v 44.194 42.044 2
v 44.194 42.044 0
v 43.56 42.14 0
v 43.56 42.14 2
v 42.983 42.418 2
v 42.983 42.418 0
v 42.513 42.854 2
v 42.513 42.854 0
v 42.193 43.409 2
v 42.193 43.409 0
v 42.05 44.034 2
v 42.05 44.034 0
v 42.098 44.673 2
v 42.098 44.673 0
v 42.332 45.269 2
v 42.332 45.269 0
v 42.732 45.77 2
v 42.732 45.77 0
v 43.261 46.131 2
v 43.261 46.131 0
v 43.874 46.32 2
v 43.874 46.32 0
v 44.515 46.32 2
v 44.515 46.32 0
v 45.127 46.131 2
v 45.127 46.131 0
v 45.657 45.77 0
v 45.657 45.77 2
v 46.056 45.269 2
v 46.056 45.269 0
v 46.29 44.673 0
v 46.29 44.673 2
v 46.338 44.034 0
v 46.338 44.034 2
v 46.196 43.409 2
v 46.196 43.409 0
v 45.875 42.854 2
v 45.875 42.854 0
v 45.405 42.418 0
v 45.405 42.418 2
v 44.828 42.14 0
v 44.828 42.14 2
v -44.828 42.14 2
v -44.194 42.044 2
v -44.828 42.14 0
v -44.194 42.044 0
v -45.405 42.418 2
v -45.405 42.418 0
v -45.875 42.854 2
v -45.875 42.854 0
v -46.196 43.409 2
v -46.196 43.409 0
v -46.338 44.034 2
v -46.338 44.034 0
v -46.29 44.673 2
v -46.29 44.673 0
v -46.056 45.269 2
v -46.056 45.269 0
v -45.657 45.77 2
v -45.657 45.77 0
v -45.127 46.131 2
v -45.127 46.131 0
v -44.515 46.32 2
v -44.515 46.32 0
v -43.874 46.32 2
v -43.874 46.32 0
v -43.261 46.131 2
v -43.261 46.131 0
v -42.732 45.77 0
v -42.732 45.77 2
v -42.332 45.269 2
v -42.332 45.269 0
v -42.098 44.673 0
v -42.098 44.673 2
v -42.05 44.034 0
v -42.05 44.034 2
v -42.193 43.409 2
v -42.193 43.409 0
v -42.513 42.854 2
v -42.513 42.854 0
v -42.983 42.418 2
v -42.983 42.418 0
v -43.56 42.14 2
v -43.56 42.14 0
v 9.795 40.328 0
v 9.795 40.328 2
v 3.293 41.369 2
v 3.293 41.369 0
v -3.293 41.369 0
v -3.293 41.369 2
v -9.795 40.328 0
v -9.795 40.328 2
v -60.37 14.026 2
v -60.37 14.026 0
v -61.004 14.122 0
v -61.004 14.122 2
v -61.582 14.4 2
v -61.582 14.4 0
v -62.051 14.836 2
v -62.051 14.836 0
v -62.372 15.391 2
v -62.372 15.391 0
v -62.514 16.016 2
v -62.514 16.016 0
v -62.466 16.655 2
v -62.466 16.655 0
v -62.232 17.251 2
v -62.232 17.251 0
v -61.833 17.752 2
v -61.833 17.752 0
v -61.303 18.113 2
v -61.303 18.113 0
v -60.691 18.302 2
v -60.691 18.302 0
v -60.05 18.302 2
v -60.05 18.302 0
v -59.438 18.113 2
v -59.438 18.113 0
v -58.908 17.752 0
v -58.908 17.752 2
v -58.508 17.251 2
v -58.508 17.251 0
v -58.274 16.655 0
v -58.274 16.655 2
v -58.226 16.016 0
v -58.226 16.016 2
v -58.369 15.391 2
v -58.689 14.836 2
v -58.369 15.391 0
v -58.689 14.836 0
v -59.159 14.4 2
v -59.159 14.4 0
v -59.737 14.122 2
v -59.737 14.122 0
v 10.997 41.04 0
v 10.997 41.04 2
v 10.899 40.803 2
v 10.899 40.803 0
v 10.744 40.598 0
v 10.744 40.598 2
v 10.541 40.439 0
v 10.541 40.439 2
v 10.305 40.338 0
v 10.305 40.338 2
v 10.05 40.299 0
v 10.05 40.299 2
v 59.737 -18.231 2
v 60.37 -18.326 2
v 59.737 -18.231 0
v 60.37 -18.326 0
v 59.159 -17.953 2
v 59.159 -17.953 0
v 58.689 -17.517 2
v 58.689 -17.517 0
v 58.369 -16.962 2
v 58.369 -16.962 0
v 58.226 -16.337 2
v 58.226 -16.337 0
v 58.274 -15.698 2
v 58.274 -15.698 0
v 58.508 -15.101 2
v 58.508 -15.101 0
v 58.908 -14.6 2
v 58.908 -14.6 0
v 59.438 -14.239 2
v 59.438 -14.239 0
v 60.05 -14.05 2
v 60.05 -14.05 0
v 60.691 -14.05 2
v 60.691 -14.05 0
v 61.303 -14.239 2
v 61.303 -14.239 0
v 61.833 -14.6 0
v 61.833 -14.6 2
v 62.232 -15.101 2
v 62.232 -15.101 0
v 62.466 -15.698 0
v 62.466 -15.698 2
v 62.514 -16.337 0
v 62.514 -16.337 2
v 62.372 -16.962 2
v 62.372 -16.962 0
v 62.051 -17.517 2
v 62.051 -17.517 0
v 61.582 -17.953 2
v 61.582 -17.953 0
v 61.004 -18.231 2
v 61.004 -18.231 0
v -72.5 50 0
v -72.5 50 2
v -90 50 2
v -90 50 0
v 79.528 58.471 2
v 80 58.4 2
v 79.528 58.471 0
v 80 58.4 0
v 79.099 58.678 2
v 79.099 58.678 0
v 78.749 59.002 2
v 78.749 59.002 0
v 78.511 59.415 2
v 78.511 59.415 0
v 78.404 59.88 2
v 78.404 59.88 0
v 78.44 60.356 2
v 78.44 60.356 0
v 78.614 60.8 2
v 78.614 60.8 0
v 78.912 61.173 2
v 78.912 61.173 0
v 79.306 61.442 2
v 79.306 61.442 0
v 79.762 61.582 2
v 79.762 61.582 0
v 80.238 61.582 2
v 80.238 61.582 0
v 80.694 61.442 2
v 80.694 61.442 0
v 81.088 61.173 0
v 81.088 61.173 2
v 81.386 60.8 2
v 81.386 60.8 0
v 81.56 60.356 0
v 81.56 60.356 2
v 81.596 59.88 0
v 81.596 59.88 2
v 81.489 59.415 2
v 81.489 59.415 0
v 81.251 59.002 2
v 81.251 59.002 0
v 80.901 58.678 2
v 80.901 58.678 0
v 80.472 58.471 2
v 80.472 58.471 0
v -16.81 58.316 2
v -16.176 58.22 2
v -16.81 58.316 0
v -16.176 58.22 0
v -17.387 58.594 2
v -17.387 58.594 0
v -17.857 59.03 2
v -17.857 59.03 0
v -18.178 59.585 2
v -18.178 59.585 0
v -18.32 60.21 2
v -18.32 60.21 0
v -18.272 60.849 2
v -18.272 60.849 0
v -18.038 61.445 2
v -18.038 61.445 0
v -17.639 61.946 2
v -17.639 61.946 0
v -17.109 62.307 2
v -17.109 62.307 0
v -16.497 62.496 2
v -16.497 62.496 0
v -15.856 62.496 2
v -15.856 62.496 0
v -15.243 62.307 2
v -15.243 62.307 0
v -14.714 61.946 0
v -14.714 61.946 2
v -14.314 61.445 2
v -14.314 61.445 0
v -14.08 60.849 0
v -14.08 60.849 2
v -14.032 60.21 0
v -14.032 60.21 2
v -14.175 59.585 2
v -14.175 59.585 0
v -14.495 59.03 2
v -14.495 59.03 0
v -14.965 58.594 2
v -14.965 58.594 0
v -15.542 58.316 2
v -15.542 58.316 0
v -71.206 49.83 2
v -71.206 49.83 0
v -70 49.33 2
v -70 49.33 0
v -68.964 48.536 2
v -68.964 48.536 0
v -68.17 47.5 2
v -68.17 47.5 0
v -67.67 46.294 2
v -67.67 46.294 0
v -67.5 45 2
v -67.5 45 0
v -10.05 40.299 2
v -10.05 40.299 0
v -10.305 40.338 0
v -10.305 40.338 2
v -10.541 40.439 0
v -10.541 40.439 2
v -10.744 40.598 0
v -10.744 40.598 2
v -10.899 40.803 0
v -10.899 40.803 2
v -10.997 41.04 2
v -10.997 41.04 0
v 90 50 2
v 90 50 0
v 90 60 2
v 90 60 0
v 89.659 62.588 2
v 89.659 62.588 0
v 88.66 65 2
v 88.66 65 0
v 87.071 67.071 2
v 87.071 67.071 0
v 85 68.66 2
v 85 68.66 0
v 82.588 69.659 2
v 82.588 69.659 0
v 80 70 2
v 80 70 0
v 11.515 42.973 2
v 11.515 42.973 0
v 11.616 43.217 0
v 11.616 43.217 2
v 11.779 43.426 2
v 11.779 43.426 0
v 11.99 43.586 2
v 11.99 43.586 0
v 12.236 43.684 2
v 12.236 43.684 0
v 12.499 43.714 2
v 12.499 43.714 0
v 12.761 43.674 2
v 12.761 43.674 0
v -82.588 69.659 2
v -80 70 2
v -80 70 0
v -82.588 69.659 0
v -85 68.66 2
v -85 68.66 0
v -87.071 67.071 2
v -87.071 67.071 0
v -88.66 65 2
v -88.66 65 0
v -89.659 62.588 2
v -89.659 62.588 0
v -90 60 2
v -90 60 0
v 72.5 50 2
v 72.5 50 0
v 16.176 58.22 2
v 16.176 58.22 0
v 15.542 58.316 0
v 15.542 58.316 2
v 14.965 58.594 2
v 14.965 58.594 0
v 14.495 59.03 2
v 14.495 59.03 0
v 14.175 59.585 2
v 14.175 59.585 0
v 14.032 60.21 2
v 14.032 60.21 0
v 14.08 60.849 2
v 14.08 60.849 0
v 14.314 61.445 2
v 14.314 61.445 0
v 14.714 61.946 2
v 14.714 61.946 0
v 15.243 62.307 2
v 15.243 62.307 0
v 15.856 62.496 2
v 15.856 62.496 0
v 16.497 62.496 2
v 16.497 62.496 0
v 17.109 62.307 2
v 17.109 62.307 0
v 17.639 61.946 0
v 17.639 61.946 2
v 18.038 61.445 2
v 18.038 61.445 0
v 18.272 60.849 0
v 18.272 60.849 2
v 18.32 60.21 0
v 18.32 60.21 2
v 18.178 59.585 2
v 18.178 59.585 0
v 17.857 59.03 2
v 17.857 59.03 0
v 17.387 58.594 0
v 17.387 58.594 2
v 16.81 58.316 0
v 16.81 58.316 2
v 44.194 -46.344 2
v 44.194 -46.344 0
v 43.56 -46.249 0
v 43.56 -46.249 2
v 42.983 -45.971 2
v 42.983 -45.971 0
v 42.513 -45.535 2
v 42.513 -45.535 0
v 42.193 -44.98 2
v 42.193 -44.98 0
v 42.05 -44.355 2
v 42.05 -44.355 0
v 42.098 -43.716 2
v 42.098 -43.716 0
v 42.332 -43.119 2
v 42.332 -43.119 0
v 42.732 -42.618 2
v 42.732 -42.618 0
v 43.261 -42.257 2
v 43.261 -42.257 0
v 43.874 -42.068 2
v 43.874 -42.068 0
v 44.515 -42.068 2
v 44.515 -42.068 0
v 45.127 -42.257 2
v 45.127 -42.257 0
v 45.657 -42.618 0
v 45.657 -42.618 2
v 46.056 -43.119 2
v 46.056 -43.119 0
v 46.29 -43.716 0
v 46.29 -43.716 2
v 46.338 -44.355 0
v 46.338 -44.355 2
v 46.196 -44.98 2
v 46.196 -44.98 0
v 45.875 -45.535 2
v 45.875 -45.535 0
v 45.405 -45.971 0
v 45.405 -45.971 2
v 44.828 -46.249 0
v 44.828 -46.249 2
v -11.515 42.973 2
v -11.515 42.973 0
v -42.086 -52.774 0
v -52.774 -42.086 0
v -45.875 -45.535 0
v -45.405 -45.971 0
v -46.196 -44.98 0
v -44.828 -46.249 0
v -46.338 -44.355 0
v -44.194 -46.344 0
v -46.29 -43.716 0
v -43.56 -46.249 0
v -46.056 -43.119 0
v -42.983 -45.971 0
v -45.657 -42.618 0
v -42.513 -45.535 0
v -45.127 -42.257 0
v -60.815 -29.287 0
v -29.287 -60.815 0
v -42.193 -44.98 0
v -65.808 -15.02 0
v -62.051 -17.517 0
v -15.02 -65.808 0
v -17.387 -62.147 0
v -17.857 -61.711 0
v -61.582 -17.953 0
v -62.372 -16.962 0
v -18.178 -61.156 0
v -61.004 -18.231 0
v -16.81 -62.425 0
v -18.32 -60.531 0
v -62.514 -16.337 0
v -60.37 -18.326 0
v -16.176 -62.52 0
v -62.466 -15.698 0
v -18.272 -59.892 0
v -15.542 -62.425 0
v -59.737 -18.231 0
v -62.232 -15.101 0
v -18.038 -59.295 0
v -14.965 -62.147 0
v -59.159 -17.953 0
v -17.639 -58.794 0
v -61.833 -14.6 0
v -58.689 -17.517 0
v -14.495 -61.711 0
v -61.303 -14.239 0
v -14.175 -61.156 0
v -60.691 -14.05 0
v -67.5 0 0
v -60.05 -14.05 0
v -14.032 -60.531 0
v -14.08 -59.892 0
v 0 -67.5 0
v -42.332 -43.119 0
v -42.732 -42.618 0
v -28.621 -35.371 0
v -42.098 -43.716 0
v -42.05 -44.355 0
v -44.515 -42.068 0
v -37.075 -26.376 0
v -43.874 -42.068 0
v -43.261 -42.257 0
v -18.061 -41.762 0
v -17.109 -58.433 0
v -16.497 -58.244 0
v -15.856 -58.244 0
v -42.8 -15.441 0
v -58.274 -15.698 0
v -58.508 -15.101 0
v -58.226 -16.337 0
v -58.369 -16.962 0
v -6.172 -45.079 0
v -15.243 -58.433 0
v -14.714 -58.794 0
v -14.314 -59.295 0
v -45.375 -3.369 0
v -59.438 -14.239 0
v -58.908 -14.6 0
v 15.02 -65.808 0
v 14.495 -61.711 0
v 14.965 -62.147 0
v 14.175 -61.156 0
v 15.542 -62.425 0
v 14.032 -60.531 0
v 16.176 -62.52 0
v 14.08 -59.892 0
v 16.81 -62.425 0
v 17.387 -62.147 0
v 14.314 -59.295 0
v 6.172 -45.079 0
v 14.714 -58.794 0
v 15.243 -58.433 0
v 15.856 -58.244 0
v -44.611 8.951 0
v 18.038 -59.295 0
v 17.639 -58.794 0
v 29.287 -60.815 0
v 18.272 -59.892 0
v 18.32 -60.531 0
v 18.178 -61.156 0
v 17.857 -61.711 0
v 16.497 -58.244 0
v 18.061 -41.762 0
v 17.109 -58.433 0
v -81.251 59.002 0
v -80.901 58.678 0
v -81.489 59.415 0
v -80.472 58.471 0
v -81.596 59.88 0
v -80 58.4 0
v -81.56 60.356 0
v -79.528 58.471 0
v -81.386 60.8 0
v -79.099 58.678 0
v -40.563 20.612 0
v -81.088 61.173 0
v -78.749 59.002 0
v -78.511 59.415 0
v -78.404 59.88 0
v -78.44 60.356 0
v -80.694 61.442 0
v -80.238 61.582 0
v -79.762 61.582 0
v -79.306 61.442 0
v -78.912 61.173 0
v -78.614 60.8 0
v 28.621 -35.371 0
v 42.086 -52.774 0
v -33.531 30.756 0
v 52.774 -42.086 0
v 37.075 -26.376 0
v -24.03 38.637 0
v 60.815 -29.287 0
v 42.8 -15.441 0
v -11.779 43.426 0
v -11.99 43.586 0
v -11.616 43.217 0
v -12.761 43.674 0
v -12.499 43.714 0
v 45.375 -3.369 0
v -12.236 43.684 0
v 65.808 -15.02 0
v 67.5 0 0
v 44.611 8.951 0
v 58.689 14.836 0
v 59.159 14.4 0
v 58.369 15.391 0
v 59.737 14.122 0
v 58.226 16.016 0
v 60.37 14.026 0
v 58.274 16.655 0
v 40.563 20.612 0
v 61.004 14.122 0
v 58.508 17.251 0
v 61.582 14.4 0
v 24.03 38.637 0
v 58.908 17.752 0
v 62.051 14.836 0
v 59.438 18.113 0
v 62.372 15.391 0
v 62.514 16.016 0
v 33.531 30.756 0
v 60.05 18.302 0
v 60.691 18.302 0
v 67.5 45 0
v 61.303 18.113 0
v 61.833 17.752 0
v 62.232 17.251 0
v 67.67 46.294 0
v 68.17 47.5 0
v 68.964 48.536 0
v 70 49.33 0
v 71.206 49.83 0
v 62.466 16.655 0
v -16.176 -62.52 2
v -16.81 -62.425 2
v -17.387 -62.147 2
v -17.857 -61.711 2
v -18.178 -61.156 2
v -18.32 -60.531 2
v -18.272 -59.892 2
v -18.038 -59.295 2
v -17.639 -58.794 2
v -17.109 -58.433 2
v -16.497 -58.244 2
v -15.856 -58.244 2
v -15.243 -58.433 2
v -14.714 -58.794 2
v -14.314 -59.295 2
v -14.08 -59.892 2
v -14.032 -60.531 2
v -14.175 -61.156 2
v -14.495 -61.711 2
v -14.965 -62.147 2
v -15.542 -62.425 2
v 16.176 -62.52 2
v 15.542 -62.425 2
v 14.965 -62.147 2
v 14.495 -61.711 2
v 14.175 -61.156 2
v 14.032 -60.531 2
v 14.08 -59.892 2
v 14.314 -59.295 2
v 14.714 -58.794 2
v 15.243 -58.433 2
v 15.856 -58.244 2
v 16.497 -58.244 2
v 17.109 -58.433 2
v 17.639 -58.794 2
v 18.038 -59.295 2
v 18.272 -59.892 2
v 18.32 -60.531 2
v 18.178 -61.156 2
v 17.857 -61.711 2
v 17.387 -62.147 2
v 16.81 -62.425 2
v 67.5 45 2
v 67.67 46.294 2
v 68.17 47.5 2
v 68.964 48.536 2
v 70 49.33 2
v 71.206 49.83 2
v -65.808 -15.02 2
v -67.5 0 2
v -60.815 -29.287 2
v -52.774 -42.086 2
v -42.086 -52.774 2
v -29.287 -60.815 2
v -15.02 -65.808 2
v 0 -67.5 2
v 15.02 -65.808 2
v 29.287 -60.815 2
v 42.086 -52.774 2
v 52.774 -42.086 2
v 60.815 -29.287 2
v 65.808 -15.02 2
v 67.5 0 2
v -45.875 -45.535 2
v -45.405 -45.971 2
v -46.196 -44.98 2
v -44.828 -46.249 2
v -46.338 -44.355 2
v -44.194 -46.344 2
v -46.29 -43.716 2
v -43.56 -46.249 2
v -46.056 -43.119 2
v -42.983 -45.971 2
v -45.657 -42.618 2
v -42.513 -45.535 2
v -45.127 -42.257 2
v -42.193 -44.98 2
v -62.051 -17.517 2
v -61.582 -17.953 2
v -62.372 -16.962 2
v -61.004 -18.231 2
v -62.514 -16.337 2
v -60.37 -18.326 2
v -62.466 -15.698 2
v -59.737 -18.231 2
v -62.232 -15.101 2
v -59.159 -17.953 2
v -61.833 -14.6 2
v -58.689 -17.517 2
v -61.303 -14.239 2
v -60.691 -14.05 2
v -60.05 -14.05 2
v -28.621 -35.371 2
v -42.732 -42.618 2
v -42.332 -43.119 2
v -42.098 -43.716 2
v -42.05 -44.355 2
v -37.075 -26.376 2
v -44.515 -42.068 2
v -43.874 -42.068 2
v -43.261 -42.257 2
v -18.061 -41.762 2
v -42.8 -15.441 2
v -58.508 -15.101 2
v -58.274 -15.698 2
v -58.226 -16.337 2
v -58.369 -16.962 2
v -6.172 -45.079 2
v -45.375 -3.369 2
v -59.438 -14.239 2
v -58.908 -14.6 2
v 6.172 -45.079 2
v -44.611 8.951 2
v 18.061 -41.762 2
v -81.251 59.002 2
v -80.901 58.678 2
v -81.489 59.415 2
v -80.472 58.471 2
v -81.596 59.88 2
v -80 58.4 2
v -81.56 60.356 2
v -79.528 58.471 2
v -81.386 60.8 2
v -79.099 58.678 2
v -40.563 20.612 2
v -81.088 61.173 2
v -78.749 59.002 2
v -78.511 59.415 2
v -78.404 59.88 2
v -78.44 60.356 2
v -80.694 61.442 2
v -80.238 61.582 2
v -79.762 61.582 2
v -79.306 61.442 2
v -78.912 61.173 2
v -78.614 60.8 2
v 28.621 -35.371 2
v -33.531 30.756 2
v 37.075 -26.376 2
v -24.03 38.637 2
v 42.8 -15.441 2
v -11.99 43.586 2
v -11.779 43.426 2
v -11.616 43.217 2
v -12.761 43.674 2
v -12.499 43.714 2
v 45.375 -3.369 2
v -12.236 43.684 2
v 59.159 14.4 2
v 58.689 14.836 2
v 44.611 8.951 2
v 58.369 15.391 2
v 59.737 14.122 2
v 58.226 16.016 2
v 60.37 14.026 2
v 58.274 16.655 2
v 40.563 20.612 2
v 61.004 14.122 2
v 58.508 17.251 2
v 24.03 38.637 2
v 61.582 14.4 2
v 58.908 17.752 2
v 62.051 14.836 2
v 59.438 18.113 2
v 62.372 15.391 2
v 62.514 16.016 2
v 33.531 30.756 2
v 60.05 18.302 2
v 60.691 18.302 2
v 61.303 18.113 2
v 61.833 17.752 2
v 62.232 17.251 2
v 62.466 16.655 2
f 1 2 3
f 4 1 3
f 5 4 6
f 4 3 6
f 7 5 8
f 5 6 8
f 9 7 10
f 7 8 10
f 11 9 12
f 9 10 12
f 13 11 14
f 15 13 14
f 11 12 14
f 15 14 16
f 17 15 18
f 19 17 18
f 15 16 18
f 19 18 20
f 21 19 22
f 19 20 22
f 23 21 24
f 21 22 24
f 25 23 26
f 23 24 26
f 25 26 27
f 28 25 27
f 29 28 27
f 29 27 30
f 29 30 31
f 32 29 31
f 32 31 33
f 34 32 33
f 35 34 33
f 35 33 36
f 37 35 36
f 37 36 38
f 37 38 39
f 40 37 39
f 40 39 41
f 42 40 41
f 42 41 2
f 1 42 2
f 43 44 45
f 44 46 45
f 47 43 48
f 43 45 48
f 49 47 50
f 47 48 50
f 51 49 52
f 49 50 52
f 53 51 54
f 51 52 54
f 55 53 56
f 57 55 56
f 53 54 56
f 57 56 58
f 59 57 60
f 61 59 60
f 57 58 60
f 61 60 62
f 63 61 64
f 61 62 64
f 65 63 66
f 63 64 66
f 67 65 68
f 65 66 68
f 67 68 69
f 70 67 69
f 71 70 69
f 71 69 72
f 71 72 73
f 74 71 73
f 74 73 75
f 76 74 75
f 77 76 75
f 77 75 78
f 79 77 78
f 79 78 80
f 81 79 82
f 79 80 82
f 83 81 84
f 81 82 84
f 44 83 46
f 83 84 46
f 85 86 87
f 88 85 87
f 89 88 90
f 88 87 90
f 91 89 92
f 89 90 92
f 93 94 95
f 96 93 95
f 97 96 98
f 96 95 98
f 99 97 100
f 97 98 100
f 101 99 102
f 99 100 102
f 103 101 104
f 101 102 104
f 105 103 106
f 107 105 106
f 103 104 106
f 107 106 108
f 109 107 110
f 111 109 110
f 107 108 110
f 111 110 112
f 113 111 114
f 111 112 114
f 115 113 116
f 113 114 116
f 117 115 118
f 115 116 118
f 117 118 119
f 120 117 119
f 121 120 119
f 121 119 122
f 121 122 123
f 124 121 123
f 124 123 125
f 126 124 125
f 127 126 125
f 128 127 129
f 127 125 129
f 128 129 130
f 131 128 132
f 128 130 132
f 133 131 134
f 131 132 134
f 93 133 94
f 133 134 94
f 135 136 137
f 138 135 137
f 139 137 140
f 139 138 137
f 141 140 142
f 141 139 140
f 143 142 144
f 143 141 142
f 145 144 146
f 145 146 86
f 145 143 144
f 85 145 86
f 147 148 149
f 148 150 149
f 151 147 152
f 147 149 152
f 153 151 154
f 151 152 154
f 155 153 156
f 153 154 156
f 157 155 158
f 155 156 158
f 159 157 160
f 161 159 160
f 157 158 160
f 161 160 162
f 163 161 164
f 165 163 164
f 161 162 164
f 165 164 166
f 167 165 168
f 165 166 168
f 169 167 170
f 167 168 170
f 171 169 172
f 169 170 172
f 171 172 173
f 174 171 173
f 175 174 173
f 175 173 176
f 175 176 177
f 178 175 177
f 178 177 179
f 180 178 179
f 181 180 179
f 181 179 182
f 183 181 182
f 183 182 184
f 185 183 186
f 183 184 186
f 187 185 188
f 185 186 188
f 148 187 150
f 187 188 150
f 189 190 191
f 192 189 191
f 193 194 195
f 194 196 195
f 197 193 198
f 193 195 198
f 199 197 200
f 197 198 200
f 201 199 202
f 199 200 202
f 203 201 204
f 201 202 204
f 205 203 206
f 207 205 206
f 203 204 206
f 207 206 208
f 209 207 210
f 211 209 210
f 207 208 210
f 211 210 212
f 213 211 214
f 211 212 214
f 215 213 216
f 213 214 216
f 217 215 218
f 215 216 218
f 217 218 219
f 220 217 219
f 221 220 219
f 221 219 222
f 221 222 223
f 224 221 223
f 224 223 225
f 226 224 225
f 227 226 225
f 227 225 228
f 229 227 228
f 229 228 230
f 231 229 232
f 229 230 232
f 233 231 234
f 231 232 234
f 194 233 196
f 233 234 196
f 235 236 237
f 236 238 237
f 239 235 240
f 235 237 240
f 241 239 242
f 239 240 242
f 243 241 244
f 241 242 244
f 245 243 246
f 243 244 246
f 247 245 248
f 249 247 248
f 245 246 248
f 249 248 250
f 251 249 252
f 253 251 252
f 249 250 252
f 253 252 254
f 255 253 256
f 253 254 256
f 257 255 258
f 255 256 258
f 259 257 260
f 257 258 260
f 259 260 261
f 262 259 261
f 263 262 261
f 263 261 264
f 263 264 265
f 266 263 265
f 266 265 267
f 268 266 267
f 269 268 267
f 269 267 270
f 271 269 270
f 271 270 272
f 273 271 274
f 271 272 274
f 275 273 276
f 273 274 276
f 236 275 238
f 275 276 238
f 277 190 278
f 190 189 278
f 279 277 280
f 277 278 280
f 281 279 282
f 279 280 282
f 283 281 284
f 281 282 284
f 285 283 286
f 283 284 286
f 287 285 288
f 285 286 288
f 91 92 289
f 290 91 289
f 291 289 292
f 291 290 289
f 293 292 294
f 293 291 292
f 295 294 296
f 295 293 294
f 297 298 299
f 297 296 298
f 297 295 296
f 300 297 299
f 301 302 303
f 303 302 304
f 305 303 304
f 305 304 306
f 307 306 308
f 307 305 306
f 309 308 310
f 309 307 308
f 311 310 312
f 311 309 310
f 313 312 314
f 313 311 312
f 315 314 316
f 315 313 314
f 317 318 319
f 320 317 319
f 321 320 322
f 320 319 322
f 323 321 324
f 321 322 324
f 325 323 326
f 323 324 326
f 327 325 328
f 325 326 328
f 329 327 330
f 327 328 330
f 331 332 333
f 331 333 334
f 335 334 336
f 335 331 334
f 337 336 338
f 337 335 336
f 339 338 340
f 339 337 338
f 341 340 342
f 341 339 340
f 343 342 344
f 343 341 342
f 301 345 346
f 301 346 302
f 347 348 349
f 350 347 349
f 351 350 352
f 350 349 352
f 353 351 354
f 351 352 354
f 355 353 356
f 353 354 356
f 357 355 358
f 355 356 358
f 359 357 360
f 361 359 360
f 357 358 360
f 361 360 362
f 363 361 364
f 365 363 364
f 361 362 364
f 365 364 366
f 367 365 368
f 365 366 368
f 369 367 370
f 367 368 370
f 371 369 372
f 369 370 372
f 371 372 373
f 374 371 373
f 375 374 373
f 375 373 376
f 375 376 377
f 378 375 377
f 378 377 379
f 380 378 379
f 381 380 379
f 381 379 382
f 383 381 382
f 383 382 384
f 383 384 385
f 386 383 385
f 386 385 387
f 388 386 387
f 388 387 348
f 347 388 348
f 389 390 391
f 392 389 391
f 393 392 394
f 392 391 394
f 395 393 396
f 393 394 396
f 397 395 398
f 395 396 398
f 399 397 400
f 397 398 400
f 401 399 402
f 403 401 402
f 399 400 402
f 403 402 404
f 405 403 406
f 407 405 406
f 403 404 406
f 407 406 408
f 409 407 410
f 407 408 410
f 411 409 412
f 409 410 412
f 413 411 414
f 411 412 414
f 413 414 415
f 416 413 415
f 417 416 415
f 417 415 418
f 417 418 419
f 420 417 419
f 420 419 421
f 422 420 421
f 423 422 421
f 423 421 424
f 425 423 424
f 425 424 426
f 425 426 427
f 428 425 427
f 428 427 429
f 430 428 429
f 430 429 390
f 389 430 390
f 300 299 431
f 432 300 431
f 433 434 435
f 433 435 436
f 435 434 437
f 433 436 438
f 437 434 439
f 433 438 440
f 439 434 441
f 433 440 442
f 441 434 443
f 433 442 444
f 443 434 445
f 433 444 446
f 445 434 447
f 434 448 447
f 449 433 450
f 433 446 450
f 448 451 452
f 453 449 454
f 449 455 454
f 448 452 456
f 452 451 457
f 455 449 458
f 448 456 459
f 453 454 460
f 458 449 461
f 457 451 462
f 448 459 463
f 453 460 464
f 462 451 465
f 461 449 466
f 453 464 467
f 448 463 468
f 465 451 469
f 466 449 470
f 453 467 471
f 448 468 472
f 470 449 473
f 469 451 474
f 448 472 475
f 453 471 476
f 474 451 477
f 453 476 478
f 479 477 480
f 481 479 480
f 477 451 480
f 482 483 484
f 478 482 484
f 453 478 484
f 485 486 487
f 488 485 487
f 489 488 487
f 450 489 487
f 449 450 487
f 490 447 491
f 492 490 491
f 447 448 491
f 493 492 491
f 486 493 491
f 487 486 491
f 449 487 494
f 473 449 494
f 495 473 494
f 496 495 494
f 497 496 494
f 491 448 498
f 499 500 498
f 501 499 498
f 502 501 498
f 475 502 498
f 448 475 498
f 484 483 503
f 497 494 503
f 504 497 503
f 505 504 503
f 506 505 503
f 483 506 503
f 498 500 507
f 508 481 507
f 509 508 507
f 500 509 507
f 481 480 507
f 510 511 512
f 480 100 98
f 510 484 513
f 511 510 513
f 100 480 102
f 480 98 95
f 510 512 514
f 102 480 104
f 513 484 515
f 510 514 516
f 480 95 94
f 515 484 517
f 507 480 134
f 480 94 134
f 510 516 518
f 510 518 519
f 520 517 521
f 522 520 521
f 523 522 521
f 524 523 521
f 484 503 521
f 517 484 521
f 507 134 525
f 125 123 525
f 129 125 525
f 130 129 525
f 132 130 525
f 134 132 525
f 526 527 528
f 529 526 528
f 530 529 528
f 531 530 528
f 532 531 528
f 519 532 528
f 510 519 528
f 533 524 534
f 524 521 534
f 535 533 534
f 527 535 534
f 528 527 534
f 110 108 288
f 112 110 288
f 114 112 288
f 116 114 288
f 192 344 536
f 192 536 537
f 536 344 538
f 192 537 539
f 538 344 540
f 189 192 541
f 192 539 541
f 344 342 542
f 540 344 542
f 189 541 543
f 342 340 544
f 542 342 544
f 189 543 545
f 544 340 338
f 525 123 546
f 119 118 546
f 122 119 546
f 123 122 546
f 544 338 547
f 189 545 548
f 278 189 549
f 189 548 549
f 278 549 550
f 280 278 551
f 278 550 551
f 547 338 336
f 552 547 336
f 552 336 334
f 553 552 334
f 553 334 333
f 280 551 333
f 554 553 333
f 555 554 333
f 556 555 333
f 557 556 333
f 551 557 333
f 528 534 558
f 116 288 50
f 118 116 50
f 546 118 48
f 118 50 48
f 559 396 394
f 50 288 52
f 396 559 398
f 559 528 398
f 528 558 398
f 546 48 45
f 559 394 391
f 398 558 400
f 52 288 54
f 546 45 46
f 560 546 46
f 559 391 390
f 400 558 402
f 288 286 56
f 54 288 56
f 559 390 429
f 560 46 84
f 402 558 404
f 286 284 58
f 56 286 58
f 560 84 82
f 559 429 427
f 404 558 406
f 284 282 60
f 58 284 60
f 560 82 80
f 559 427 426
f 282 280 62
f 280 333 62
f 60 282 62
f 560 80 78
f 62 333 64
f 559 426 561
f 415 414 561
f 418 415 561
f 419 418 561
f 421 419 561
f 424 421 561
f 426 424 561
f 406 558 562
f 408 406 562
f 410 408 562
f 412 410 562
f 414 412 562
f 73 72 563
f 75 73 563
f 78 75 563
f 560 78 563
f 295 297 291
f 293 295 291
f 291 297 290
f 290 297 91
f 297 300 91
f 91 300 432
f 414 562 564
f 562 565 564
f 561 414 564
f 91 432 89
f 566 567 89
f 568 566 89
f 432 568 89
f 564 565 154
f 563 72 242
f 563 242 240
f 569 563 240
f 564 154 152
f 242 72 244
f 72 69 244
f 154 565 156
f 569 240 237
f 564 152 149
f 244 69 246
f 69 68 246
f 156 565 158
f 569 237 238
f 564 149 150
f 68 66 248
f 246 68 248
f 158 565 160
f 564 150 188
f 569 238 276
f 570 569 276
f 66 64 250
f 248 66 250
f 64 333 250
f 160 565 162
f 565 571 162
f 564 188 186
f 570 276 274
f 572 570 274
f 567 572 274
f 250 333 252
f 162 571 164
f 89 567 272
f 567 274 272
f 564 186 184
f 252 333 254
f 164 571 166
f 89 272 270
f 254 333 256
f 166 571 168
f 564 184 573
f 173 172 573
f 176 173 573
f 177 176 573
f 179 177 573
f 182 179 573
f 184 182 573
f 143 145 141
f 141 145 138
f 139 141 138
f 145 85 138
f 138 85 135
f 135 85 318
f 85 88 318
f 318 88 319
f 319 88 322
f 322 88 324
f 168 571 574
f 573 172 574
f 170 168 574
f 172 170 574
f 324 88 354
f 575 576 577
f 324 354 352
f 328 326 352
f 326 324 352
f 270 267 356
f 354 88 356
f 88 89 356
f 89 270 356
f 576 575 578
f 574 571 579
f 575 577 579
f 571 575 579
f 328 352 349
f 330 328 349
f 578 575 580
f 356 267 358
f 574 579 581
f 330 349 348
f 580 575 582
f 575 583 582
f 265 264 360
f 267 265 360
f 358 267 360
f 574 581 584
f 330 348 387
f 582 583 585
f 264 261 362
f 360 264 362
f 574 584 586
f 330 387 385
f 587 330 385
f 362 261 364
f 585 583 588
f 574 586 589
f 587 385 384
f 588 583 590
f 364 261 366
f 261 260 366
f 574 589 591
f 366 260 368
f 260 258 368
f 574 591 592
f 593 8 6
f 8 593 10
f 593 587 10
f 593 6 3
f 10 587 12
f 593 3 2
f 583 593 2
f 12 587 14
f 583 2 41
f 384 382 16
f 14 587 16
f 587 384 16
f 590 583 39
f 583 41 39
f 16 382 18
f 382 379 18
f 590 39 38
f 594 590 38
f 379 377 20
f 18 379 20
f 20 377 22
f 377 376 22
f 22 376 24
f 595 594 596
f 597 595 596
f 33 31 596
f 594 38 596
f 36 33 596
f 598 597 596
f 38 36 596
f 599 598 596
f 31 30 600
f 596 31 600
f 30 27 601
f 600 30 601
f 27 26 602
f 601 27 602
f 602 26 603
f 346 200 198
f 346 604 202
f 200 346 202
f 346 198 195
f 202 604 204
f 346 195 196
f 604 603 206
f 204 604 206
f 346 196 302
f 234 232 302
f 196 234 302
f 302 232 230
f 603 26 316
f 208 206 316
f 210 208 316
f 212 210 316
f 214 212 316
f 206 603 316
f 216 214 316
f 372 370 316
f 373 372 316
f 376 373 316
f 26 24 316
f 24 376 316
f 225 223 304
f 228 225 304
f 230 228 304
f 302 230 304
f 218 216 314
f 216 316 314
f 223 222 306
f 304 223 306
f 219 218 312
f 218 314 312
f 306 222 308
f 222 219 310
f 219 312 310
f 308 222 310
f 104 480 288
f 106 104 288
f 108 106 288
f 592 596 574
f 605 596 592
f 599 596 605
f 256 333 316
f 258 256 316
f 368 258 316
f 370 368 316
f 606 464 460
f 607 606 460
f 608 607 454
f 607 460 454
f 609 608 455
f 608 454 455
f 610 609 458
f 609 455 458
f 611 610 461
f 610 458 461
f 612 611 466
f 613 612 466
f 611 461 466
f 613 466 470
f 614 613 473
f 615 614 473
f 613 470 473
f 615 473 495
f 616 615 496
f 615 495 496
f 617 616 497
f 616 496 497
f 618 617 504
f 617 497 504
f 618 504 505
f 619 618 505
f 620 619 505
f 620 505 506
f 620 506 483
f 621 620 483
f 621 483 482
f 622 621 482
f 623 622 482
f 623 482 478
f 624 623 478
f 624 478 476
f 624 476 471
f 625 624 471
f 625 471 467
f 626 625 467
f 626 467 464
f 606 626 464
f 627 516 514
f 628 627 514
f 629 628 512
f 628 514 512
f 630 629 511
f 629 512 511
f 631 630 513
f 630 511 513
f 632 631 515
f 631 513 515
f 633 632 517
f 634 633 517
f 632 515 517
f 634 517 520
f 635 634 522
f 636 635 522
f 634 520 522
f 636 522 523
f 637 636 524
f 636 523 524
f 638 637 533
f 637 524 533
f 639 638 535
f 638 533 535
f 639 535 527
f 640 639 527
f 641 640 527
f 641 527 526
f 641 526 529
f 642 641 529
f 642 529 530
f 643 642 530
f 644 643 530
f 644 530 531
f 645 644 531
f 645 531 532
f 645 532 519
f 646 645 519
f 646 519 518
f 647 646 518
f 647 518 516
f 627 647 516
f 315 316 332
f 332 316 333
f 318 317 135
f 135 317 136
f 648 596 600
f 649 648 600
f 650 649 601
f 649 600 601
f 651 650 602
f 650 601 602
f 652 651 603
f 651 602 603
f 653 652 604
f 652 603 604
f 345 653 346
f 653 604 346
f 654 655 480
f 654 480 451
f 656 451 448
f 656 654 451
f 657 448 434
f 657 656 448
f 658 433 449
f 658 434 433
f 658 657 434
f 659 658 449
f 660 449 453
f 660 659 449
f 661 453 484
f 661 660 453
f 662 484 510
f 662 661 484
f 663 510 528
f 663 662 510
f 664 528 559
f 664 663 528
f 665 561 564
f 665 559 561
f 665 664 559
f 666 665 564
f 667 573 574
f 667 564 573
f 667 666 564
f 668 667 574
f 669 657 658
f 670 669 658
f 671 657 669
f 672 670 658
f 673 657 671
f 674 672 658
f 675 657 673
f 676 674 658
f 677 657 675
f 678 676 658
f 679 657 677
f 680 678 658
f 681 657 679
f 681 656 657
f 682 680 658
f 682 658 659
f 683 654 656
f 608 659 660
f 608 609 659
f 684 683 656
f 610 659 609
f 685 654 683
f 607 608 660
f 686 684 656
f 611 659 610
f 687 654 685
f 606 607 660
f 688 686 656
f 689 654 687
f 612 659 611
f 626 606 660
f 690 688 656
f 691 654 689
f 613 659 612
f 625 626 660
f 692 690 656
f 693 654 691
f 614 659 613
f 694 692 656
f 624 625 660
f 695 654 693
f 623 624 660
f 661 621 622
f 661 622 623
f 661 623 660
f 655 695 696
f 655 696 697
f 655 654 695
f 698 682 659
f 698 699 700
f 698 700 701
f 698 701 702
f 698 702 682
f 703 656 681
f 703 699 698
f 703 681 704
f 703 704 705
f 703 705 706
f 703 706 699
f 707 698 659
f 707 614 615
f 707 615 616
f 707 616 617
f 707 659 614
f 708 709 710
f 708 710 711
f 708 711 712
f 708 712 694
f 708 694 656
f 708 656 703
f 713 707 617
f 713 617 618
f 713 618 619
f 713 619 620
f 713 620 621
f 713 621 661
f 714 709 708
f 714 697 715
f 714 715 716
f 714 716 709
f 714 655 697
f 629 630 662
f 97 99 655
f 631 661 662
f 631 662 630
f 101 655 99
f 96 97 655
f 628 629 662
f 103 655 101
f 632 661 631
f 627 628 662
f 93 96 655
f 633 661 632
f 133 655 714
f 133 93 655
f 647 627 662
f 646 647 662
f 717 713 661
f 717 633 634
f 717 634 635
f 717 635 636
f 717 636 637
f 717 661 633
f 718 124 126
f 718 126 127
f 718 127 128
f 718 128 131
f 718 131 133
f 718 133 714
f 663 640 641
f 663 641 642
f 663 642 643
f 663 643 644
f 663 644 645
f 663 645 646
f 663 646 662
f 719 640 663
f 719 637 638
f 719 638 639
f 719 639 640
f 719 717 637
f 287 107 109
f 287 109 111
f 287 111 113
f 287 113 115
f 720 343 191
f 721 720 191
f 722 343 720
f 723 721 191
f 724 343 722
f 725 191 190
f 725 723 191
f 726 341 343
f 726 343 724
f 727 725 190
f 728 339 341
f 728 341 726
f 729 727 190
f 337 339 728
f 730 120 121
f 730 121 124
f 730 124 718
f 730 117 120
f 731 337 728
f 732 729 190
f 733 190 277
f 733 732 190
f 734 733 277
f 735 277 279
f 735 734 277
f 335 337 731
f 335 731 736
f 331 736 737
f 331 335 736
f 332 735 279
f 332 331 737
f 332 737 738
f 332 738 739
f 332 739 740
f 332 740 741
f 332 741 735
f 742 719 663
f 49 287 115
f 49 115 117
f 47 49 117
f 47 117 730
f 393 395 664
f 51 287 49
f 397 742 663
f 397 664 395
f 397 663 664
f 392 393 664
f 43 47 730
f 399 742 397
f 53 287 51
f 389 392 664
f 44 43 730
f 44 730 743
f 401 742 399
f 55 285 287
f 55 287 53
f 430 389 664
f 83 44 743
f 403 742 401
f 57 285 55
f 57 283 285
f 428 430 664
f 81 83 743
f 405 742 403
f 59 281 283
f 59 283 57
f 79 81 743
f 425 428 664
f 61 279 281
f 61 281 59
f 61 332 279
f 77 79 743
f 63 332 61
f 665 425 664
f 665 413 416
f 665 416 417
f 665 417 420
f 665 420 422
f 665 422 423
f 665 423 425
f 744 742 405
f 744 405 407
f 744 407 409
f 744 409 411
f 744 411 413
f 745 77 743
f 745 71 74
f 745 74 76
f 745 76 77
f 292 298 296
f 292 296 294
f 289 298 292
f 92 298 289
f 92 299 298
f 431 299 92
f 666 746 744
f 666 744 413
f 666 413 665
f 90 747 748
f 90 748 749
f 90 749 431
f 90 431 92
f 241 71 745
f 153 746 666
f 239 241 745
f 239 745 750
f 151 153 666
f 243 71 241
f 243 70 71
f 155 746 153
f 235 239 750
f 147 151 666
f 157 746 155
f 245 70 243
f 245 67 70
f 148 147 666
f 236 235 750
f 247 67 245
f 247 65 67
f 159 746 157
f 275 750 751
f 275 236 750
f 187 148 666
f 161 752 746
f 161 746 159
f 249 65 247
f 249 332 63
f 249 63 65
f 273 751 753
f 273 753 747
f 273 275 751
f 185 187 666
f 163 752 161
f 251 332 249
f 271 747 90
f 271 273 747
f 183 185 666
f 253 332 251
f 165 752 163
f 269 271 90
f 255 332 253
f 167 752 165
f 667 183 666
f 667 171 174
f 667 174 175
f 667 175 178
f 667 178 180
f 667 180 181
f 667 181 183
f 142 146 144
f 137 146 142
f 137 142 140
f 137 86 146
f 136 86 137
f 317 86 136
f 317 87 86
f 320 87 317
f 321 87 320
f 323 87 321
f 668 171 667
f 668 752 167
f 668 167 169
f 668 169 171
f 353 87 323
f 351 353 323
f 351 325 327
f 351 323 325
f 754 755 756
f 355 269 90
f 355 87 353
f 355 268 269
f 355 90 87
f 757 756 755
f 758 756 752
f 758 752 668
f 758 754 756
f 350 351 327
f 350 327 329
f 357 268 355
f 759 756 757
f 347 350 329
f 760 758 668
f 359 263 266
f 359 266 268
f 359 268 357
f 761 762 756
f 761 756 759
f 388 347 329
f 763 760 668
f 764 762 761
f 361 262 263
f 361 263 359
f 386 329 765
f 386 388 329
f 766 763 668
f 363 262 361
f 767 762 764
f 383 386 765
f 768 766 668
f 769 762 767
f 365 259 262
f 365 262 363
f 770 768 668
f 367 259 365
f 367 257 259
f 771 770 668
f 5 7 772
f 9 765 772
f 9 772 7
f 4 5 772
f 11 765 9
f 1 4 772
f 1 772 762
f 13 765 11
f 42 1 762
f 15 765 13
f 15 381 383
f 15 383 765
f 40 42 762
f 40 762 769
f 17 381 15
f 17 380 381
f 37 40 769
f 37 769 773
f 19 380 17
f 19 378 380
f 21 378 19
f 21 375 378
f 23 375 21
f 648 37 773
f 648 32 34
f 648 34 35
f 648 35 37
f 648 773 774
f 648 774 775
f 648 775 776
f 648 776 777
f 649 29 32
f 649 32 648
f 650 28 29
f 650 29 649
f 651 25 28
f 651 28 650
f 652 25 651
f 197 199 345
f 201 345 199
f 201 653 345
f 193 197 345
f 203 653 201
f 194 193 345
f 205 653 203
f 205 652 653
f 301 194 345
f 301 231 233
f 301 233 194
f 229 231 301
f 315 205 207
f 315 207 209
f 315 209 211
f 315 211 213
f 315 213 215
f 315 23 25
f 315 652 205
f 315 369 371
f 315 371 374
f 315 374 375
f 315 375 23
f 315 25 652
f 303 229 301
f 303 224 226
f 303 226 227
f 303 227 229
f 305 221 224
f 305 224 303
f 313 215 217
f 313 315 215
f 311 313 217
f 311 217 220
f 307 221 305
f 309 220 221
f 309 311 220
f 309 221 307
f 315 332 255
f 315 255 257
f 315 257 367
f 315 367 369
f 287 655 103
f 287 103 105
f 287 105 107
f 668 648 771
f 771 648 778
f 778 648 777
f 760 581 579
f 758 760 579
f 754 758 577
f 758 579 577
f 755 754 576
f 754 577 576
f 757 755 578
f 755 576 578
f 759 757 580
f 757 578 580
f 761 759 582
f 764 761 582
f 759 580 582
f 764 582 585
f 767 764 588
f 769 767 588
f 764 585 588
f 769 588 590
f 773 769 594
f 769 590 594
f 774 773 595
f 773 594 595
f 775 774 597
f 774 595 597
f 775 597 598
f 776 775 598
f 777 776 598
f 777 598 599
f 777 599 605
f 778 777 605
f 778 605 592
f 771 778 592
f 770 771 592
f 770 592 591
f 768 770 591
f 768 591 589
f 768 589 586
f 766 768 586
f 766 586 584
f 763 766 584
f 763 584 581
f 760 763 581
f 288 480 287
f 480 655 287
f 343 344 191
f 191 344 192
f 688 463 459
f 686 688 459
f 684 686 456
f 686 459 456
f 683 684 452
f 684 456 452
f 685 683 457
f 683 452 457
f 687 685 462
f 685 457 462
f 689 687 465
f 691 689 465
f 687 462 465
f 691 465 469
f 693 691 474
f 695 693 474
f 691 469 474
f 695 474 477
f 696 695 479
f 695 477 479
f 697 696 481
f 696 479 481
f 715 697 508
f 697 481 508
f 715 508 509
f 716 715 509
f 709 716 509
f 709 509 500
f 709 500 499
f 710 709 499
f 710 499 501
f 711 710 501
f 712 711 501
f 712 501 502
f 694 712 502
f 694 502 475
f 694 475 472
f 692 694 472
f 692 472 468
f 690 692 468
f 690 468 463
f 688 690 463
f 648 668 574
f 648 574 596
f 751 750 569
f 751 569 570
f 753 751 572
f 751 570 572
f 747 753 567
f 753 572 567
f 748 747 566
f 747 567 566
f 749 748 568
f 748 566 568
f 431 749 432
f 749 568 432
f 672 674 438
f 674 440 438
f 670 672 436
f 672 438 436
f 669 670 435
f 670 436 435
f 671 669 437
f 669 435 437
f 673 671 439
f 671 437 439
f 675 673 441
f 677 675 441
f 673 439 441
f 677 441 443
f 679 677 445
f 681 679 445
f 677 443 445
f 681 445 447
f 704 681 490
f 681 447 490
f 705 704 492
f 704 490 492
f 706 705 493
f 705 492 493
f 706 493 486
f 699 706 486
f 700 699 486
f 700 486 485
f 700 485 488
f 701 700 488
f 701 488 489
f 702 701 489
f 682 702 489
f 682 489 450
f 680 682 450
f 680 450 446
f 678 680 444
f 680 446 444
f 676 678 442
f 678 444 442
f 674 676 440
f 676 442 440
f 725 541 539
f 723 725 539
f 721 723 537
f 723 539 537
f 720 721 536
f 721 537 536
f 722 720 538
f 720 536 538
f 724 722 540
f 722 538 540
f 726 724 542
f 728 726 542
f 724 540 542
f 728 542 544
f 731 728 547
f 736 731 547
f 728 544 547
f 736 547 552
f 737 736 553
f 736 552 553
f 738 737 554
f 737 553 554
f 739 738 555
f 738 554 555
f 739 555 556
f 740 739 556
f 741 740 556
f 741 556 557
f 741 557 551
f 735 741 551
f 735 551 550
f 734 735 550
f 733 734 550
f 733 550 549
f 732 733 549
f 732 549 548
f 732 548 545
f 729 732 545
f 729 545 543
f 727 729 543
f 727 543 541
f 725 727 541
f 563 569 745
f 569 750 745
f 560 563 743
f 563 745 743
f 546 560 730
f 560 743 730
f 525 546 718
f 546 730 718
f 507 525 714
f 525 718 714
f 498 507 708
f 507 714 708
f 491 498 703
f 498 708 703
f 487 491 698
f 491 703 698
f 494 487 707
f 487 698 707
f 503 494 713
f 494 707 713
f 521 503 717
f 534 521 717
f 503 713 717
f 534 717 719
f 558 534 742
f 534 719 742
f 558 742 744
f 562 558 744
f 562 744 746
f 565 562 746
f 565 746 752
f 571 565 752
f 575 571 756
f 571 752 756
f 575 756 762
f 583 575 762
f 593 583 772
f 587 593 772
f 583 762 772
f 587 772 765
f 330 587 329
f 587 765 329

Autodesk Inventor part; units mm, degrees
ref_plane "YZ Plane" through (0, 0, 0) normal (1, 0, 0) x (0, 1, 0)
ref_plane "XZ Plane" through (0, 0, 0) normal (0, 1, 0) x (-1, 0, 0)
ref_plane "XY Plane" through (0, 0, 0) normal (0, 0, 1) x (1, 0, 0)
sketch "スケッチ1" plane through (0, 0, 0) normal (0, 0, 1) x (1, 0, 0)
  line L0 (-90, -67.5) -> (90, -67.5)
  line L1 (90, -67.5) -> (90, 70)
  line L2 (90, 70) -> (-90, 70)
  line L3 (-90, 70) -> (-90, -67.5)
  point P0 (0, 0)
  point P1 (-29.0861, -67.5)
  dimension "d37" = 90
  dimension "d38" = 70
  dimension "d40" = 90
  dimension "d41" = 67.5
extrude "プレート1" add sketch "スケッチ1" along normal blind 2
sketch "スケッチ2" plane through (0, 0, 2) normal (0, 0, 1) x (1, 0, 0)
  circle A0 centre (0, 0) radius 45.5
  dimension "d5" = 91
extrude "押し出し1" cut sketch "スケッチ2" against normal blind 10
sketch "スケッチ3" plane through (0, 0, 2) normal (0, 0, 1) x (1, 0, 0)
  circle A0 centre (0, 0) radius 62.5
  point P0 (-16.1762, 60.3704)
  point P1 (-44.1942, 44.1942)
  point P2 (-60.3704, 16.1762)
  point P3 (-60.3704, -16.1762)
  point P4 (-44.1942, -44.1942)
  point P5 (-16.1762, -60.3704)
  point P6 (16.1762, -60.3704)
  point P7 (44.1942, -44.1942)
  point P8 (60.3704, -16.1762)
  point P9 (60.3704, 16.1762)
  point P10 (44.1942, 44.1942)
  point P11 (16.1762, 60.3704)
  dimension "d8" = 125
  dimension "d11" = 360
  dimension "d20" = 0
hole "穴1" at (-16.1762, 60.3704, 2) at (-44.1942, 44.1942, 2) at (-60.3704, 16.1762, 2) at (-60.3704, -16.1762, 2) at (-44.1942, -44.1942, 2) at (-16.1762, -60.3704, 2) at (16.1762, -60.3704, 2) at (44.1942, -44.1942, 2) at (60.3704, -16.1762, 2) at (60.3704, 16.1762, 2) at (44.1942, 44.1942, 2) at (16.1762, 60.3704, 2) direction (0, 0, -1) diameter 4.3 end through all clearance for "Flat Head Machine Screw" size "M4" standard "Ansi Metric M Profile"
fillet "コーナーR2" radius 10 2 edges at (-90, 70, 1) (90, 70, 1)
sketch "スケッチ5" plane through (0, 0, 2) normal (0, 0, 1) x (1, 0, 0)
  arc A0 (-80, 70) -> (-90, 60) centre (-80, 60) ccw projected
  arc A1 (90, 60) -> (80, 70) centre (80, 60) ccw projected
  point P0 (0, 0)
hole "穴2" at (-80, 60, 2) at (80, 60, 2) direction (0, 0, -1) diameter 3.2 end through all clearance for "Socket Head Cap Screw" size "M3" standard "Ansi Metric M Profile"
sketch "スケッチ7" plane through (0, 0, 2) normal (0, 0, 1) x (1, 0, 0)
  circle A0 centre (0, 0) radius 45.5 projected
  circle A1 centre (0, 0) radius 67.5
  line L0 (90, -67.5) -> (-90, -67.5) projected
  line L1 (-90, -67.5) -> (-90, 60) projected
  line L2 (-90, -67.5) -> (-67.5, -67.5)
  line L3 (-67.5, -67.5) -> (-67.5, 50)
  line L4 (-67.5, 50) -> (-90, 50)
  line L5 (-90, 50) -> (-90, -67.5)
  line L6 (90, -67.5) -> (67.5, -67.5)
  line L7 (67.5, -67.5) -> (67.5, 50)
  line L8 (67.5, 50) -> (90, 50)
  line L9 (90, 50) -> (90, -67.5)
  line L10 (-80, 70) -> (80, 70) projected
  point P0 (67.5, 0)
  point P1 (0, -67.5)
  point P2 (-67.5, 0)
  dimension "d56" = 20
  dimension "d57" = 20
extrude "押し出し4" cut sketch "スケッチ7" against normal blind 10 contours L7 L0 A1 | L7 L8 L9 L0 | A1 L0 L3 | L3 L0 L1 L4
fillet "コーナーR4" radius 5 2 edges at (-67.5, 50, 1) (67.5, 50, 1)
sketch "スケッチ9" plane through (0, 0, 2) normal (0, 0, 1) x (1, 0, 0)
  circle A0 centre (0, 0) radius 45.5 projected
  circle A1 centre (0, 0) radius 41.5
  line L0 (0, 0) -> (-11.7763, 43.9496)
  line L1 (11.7763, 43.9496) -> (0, 0)
  line L2 (0, 97.5) -> (0, -95) projected
  point P0 (-10.741, 40.0859)
  point P1 (10.741, 40.0859)
  dimension "d76" = 4
  dimension "d77" = 15
  dimension "d78" = 15
extrude "押し出し5" add sketch "スケッチ9" against normal up to surface (2 mm away) contours L1 A1 L2 A0 | L2 A1 L0 A0 picked at (5.1612, 43.8259) picked at (-6.3577, 43.6684)
fillet "コーナーR5" radius 1 4 edges at (10.741, 40.0859, 1) (-10.741, 40.0859, 1) (-11.7763, 43.9496, 1) (11.7763, 43.9496, 1)
equation "\"d40\" = d37"
equation "\"d18\" = Thickness"
equation "\"d47\" = Thickness"
equation "\"d2\" = Thickness"
equation "\"BendRadius\" = Thickness"
equation "\"BendReliefWidth\" = Thickness"
equation "\"BendReliefDepth\" = 0.5 * Thickness"
equation "\"CornerReliefSize\" = 4 * Thickness"
equation "\"MinimumRemnant\" = 2 * Thickness"
equation "\"TransitionRadius\" = BendRadius"
equation "\"JacobiRadiusSize\" = BendRadius"
equation "\"GapSize\" = Thickness"
equation "\"Thickness\" = 2"
properties part number "base4" material "CFRP"
